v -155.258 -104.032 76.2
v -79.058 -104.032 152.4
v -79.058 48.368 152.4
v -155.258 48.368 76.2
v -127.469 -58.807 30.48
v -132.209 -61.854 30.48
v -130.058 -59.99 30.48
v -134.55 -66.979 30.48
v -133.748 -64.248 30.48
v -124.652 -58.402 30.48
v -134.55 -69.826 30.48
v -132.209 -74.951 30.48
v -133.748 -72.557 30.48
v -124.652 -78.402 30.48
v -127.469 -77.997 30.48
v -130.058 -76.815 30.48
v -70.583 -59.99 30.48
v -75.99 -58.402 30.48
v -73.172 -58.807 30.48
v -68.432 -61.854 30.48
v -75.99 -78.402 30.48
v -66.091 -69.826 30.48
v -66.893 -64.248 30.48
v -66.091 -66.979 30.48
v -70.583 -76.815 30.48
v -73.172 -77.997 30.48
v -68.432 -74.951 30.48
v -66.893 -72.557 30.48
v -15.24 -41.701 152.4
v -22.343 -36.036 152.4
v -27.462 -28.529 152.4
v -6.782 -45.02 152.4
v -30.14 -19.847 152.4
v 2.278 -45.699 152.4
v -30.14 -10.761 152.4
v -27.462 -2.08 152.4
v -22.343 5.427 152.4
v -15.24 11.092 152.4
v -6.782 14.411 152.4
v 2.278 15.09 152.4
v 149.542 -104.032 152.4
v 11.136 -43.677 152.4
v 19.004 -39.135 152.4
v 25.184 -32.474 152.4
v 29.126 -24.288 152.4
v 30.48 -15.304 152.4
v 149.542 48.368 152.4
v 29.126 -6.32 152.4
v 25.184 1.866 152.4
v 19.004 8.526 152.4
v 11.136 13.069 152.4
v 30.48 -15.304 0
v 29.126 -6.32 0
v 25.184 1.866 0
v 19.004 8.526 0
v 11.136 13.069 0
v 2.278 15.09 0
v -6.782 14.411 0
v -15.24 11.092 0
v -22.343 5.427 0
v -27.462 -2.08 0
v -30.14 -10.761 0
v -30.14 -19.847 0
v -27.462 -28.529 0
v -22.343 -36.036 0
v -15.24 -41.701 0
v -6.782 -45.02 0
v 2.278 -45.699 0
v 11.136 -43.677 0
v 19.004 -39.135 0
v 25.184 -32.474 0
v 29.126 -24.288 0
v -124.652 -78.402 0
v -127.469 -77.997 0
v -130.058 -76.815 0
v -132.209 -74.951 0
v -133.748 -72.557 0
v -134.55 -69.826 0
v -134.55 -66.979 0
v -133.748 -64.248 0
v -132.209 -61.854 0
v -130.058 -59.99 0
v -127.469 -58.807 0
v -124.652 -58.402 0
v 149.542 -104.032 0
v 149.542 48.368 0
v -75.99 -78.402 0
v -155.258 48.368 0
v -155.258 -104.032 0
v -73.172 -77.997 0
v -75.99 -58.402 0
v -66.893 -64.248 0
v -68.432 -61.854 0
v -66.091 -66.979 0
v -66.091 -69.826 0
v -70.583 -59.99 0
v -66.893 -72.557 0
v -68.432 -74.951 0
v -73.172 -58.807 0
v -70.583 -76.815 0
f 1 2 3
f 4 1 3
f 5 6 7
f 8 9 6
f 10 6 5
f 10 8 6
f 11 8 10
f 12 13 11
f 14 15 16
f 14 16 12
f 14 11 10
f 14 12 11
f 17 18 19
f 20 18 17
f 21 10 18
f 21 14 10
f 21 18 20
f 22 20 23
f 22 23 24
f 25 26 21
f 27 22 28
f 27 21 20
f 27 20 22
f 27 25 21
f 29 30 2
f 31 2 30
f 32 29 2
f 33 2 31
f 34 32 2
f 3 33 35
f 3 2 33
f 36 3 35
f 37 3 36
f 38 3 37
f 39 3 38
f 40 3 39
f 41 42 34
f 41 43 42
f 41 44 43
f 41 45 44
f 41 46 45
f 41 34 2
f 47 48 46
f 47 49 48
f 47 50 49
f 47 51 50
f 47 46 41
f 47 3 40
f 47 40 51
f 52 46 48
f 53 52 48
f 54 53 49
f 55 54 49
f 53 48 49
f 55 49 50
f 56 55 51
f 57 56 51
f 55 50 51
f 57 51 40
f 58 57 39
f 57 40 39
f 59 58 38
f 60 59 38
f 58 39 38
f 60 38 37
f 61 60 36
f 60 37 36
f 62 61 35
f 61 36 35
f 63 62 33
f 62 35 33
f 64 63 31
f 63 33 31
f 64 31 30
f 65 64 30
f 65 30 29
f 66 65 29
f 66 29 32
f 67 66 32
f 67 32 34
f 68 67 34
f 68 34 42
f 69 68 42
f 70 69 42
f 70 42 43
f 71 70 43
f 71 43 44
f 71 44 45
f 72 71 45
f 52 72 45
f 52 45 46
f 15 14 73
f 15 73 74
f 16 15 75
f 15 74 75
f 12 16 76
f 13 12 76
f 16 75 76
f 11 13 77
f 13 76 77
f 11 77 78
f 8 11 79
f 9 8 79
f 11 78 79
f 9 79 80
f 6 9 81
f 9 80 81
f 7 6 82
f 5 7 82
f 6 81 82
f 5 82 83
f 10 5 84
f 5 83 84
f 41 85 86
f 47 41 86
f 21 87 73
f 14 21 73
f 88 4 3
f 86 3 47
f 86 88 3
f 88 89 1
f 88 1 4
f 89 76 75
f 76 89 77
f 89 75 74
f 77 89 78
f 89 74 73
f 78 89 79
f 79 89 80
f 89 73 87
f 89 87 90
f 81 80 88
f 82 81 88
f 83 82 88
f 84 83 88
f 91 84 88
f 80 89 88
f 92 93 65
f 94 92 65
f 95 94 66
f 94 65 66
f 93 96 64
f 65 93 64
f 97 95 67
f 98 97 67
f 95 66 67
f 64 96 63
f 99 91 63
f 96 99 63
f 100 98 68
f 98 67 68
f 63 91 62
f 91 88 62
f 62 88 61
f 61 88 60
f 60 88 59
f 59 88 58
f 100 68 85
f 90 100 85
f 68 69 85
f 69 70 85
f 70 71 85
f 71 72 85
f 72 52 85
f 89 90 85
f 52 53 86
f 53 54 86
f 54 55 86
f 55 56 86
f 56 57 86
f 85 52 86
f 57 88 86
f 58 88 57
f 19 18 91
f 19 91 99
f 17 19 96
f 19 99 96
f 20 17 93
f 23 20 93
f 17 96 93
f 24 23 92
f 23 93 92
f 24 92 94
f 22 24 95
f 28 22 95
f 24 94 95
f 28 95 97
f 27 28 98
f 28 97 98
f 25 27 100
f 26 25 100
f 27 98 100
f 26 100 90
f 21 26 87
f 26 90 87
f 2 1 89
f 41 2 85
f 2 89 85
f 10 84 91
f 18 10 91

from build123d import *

# Parameters (mm, degrees)
F0_W     = 304.8
F0_H     = 152.4
F1_DEPTH = 152.4
F9_R     = 30.48
F5_DEPTH = 152.401
F6_SIZE  = 76.2
F8_DEPTH = 30.48


# Not quite as in the source:
# - the program builds the solid bodies; features that only make, move or delete a surface that nothing else refers to are left out


with BuildPart() as f1:
    # F0 (on Top) → F1 (new body)
    with BuildSketch(Plane.XY):
        with Locations((-2.8575006872, -27.8319329938)):
            Rectangle(F0_W, F0_H)
    extrude(amount=F1_DEPTH)

    # F9 (on face) → F5 (cut, through all)
    with BuildSketch(Plane.XY.offset(152.4)):
        with Locations((0, -15.3043069538)):
            Circle(F9_R)
    extrude(amount=-F5_DEPTH, mode=Mode.SUBTRACT)

    # F6
    f6_edges = [f1.edges().sort_by_distance(p)[0] for p in [
        (-155.257501, -27.831933, 152.4),
    ]]
    chamfer(f6_edges, length=F6_SIZE)

    # F7 (on face) → F8 (cut)
    with BuildSketch(Plane(origin=(0, 0, 0), x_dir=(1, 0, 0), z_dir=(0, 0, -1))):
        with BuildLine():
            ThreePointArc((-124.6516630054, 78.40236485), (-134.6516630054, 68.40236485), (-124.6516630054, 58.40236485))
            Line((-124.6516630054, 58.40236485), (-75.9895667434, 58.40236485))
            ThreePointArc((-75.9895667434, 58.40236485), (-65.9895667434, 68.40236485), (-75.9895667434, 78.40236485))
            Line((-75.9895667434, 78.40236485), (-124.6516630054, 78.40236485))
        make_face()
    extrude(amount=-F8_DEPTH, mode=Mode.SUBTRACT)


solid = f1.part
